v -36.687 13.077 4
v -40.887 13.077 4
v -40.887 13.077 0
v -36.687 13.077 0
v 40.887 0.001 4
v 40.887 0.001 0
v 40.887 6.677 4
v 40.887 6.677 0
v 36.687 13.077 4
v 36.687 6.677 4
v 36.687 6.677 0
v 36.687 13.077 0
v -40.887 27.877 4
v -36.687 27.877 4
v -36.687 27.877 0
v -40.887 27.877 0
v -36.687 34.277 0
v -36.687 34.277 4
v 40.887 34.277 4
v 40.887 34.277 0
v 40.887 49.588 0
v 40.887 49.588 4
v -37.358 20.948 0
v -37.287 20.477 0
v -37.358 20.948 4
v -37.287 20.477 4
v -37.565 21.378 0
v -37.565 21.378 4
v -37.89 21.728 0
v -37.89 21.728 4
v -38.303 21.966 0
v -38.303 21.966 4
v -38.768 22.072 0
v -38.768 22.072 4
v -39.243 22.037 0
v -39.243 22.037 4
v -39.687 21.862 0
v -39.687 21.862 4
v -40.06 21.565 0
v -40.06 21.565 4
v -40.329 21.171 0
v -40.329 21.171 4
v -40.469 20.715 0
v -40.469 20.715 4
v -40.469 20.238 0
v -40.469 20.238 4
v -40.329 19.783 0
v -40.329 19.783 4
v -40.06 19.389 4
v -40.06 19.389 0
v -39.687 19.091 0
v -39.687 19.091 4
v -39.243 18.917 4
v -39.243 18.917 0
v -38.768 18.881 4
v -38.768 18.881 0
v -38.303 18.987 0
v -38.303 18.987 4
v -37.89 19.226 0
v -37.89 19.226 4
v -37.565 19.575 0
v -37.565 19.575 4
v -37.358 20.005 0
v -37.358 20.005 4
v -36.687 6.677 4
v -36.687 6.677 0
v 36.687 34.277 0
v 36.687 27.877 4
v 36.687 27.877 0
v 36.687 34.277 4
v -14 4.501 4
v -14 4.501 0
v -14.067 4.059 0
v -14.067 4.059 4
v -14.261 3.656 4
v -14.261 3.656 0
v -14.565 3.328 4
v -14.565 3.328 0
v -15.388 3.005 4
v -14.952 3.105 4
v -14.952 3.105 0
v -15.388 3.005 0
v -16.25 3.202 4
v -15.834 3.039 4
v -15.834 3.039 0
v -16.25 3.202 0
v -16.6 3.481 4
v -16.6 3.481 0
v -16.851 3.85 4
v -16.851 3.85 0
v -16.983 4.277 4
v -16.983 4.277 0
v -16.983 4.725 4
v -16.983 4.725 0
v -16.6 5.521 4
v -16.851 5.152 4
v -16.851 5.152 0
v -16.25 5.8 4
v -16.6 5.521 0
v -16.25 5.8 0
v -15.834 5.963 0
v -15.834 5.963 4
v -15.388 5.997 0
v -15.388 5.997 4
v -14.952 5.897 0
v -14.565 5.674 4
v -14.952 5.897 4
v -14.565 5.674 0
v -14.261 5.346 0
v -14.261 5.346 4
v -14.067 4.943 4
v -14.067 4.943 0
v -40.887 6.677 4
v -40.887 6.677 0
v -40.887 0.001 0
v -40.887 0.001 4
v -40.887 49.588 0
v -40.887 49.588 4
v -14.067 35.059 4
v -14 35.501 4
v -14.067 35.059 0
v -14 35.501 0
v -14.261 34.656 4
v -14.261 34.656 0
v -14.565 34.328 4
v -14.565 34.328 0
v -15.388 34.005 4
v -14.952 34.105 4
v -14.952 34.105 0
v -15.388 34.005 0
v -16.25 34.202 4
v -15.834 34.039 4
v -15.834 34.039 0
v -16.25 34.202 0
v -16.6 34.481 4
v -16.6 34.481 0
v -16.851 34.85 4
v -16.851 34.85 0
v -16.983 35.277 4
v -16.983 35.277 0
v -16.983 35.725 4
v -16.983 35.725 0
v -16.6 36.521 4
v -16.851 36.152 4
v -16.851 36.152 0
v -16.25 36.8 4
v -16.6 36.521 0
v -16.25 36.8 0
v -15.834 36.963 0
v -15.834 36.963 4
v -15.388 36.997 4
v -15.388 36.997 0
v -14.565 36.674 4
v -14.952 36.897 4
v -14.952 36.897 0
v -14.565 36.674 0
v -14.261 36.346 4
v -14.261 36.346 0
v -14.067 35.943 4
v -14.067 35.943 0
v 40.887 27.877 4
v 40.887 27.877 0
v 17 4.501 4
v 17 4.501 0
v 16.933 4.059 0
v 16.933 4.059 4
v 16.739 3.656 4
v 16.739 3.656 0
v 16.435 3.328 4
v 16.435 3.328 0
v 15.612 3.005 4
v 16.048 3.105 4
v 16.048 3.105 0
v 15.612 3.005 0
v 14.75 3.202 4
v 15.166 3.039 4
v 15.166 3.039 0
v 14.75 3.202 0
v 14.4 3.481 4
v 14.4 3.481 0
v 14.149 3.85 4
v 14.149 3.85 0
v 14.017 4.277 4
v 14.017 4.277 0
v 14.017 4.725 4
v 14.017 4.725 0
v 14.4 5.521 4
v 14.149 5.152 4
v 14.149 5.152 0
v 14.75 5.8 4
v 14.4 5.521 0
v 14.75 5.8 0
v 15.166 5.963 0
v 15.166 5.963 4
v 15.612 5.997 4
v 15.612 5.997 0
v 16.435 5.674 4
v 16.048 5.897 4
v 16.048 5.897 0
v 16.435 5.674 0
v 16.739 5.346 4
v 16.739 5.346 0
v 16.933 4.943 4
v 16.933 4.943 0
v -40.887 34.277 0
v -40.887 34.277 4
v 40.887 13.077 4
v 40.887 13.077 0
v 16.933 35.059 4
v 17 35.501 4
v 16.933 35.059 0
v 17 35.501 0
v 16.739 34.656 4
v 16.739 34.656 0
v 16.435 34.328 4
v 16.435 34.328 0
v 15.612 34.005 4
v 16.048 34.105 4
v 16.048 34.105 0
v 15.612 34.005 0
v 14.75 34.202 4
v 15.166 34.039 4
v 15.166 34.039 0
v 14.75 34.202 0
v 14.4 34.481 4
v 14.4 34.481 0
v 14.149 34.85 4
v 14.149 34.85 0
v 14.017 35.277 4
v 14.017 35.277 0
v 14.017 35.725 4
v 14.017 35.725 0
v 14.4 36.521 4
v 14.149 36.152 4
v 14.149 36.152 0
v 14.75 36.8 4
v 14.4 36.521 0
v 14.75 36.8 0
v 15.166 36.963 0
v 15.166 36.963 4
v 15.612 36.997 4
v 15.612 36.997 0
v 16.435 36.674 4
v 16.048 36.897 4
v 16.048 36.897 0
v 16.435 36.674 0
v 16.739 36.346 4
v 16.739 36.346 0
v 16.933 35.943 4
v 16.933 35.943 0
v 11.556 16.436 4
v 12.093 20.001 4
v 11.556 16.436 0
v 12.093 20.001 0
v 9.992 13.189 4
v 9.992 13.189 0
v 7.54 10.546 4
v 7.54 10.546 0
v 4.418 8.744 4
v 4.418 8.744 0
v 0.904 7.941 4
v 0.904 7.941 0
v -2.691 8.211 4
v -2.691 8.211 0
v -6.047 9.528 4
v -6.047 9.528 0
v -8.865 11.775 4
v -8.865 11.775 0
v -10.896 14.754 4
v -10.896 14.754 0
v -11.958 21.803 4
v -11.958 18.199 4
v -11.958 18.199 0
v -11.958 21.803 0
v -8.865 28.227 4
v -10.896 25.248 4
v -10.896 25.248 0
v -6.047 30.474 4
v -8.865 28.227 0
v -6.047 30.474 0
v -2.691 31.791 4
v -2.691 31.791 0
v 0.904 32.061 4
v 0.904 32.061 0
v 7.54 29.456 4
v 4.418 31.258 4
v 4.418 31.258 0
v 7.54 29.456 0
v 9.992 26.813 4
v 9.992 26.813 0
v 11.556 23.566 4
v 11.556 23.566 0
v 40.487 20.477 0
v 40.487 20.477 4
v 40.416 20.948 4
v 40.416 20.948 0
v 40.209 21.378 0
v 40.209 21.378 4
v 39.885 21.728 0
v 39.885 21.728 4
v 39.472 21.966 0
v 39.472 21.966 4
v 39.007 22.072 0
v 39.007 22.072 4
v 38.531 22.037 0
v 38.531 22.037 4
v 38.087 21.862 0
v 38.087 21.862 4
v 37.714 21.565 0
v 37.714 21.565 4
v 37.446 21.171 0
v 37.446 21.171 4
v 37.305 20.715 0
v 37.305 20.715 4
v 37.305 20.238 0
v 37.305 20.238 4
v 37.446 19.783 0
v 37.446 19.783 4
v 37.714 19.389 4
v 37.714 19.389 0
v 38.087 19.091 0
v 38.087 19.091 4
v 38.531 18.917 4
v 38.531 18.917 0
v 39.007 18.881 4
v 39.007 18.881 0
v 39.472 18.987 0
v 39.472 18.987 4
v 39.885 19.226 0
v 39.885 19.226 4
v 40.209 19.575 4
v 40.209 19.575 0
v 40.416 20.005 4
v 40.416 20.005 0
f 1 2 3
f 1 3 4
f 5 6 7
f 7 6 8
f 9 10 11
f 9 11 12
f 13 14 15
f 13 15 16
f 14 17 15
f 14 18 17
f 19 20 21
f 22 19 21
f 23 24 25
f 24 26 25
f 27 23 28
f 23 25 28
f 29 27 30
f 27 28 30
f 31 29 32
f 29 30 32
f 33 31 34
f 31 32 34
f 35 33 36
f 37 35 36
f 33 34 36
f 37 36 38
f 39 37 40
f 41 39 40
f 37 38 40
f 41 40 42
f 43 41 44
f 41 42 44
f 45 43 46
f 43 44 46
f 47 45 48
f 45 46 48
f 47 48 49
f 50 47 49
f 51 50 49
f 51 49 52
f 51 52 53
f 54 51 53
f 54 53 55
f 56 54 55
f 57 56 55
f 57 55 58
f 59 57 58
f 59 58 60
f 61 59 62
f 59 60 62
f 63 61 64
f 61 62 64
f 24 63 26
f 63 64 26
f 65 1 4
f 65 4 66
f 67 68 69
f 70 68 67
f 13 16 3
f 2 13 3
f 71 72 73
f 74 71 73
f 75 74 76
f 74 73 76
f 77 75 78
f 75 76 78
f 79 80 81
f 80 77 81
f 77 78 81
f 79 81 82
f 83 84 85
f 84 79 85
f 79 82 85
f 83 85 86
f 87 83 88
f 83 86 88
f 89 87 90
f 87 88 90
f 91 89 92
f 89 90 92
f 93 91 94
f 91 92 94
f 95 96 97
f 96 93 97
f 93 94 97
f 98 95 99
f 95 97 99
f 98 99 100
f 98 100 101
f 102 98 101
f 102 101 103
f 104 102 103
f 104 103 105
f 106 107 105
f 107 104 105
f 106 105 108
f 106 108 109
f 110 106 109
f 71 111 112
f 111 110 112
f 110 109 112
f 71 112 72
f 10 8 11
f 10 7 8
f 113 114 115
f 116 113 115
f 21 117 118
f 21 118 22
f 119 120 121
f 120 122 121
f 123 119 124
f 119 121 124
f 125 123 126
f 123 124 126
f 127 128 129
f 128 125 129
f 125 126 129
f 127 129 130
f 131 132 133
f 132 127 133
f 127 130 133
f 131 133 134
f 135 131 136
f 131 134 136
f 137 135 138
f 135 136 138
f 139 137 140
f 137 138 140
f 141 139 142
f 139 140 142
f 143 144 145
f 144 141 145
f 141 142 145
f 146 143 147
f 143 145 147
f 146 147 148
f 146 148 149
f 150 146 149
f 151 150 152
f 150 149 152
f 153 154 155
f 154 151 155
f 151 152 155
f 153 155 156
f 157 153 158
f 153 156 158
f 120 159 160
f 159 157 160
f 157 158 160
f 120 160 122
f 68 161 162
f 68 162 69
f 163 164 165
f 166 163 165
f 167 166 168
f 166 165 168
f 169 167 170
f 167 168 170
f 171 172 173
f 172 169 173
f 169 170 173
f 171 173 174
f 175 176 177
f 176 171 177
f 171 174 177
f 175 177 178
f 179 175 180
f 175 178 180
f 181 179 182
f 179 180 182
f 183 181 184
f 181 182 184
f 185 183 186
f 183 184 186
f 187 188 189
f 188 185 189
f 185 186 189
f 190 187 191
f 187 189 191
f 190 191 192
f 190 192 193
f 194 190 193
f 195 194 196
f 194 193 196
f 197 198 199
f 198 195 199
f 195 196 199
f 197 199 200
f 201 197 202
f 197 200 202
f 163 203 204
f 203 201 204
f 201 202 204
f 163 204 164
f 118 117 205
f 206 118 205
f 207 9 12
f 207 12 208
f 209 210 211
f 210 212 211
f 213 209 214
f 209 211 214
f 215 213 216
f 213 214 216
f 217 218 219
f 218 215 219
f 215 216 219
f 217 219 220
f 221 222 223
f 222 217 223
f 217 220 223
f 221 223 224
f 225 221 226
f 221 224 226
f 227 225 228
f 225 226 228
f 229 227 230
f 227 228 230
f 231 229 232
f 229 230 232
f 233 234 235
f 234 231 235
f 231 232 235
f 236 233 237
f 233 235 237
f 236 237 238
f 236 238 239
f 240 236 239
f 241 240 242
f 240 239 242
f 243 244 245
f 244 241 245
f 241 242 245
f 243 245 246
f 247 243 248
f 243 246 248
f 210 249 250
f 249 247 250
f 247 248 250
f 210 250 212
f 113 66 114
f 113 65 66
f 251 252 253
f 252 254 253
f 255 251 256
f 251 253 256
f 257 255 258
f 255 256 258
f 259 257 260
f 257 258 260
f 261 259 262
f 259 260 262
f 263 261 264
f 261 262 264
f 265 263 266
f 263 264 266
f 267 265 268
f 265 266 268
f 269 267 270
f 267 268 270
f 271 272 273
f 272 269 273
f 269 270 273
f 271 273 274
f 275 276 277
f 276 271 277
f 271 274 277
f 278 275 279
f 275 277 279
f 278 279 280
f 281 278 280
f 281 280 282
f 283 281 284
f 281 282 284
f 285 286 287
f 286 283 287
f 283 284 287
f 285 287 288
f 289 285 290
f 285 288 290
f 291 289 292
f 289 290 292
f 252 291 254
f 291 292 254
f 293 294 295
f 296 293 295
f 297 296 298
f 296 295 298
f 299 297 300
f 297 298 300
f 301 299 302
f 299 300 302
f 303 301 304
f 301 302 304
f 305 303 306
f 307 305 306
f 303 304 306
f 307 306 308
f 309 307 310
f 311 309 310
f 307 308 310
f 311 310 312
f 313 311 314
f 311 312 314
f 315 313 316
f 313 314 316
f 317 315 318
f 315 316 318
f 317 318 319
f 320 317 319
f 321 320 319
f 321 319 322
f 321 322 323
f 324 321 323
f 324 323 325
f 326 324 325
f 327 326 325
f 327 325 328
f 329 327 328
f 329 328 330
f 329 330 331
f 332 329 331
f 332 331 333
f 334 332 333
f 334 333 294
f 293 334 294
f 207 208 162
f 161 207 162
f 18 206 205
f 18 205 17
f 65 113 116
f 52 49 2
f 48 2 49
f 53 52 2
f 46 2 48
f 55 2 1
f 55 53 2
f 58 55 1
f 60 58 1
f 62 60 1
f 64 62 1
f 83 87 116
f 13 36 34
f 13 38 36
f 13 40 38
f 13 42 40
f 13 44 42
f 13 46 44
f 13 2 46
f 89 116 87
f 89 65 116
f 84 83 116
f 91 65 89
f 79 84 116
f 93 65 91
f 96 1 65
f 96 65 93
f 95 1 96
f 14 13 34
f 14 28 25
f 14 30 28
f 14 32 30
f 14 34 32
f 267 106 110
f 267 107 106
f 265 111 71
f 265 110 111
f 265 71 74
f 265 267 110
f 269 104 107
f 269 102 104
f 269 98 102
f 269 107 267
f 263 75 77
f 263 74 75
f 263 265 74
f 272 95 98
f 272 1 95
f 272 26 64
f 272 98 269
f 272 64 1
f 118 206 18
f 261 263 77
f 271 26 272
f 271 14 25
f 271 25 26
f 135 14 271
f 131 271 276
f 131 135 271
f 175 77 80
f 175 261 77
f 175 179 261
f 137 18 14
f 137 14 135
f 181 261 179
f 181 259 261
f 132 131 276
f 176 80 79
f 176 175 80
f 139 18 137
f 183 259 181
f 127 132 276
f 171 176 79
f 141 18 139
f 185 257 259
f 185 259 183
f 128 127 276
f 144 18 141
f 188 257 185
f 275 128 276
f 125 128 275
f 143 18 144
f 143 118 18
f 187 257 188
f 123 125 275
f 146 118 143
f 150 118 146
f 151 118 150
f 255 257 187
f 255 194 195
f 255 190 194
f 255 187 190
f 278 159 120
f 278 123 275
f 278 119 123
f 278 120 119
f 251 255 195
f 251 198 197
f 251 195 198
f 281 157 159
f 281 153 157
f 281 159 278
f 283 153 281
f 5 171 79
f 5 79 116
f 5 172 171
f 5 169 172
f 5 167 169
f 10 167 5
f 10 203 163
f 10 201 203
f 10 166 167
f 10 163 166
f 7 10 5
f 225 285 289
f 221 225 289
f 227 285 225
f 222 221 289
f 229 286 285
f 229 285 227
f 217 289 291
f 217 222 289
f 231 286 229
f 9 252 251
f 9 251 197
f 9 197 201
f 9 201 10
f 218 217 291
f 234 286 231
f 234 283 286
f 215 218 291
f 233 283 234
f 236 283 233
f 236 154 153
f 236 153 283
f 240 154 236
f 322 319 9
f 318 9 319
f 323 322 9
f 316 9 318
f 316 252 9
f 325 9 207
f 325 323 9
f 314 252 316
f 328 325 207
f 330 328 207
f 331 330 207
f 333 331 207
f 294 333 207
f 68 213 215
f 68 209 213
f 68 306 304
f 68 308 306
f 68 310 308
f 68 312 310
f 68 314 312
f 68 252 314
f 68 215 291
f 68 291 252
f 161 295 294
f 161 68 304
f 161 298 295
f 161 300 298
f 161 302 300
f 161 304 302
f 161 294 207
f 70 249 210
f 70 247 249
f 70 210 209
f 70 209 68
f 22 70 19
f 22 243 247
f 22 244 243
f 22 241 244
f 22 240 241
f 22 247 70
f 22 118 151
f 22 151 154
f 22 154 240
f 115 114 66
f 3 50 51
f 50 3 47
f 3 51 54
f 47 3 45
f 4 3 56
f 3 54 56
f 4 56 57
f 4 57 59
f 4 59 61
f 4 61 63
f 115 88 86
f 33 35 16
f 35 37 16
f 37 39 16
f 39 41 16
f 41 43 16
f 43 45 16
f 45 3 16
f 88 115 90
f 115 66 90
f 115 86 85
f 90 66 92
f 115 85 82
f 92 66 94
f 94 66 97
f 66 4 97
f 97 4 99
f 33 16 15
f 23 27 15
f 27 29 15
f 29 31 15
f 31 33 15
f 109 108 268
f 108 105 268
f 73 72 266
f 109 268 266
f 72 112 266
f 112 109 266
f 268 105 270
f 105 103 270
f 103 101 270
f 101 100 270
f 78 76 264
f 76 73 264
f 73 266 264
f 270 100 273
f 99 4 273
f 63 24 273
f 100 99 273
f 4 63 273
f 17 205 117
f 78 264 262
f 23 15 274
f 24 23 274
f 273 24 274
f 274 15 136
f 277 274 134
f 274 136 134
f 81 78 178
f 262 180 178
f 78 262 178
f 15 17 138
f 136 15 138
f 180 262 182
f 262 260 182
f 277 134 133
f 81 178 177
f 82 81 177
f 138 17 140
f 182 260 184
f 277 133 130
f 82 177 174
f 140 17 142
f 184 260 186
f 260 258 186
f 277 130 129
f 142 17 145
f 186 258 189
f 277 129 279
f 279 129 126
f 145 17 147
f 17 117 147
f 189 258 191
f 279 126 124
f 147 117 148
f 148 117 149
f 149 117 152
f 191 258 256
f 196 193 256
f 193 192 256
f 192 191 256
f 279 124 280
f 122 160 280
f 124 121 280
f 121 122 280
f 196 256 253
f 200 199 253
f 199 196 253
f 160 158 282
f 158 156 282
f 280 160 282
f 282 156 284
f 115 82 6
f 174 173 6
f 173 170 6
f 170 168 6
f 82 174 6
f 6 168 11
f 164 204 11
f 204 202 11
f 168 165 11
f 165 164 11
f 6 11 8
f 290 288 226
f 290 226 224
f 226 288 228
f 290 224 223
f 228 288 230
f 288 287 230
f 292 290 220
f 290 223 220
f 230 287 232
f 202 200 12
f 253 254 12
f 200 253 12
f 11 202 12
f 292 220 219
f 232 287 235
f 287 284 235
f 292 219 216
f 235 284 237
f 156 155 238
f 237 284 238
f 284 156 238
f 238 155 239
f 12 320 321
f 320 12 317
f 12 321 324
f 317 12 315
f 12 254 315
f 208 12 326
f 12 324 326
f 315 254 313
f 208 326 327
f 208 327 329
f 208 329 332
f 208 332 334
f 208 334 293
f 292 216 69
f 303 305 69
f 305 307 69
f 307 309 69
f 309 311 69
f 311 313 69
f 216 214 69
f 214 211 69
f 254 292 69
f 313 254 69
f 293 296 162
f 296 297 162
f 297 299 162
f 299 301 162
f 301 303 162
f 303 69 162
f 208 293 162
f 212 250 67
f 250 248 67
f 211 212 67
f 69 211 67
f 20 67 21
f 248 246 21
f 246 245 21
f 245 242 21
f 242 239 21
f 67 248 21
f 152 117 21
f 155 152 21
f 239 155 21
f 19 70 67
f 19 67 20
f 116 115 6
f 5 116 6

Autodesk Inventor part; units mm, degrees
ref_plane "YZ Plane" through (0, 0, 0) normal (1, 0, 0) x (0, 1, 0)
ref_plane "XZ Plane" through (0, 0, 0) normal (0, 1, 0) x (-1, 0, 0)
ref_plane "XY Plane" through (0, 0, 0) normal (0, 0, 1) x (1, 0, 0)
sketch "Sketch1" plane through (0, 0, 0) normal (0, 0, 1) x (1, 0, 0)
  line L0 (20, 35.0868) -> (15.0858, 40.001) construction
  line L1 (15.0858, 40.001) -> (-15.0858, 40.001) construction
  line L2 (-15.0858, 40.001) -> (-20, 35.0868) construction
  line L3 (-20, 35.0868) -> (-20, 4.9152) construction
  line L4 (-20, 4.9152) -> (-15.0858, 0.001) construction
  line L5 (-15.0858, 0.001) -> (15.0858, 0.001) construction
  line L6 (15.0858, 0.001) -> (20, 4.9152) construction
  line L7 (20, 4.9152) -> (20, 35.0868) construction
  spline S0 degree 3 number of poles 98 construction
  spline S1 degree 3 number of poles 98 construction
  spline S2 degree 3 number of poles 98 construction
  spline S3 degree 3 number of poles 98 construction
  circle A0 centre (0, 20.001) radius 11 construction
  spline S4 degree 3 number of poles 98 construction
  spline S5 degree 3 number of poles 98 construction
  spline S6 degree 3 number of poles 98 construction
  spline S7 degree 3 number of poles 98 construction
  line L8 (-152.3368, 49.5885) -> (152.3133, 49.5884) construction
  line L9 (-40.8871, 0.001) -> (40.8871, 0.001)
  line L10 (40.8871, 0.001) -> (40.8871, 40.001)
  line L11 (40.8871, 40.001) -> (-40.8871, 40.001)
  line L12 (-40.8871, 40.001) -> (-40.8871, 0.001)
  line L13 (-40.8871, 0.001) -> (40.8871, 40.001) construction
  line L14 (40.8871, 0.001) -> (-40.8871, 40.001) construction
  line L15 (40.8871, 40.001) -> (-40.8871, 40.001)
  line L16 (-40.8871, 40.001) -> (-40.8871, 49.5885)
  line L17 (-40.8871, 49.5885) -> (40.8871, 49.5885)
  line L18 (40.8871, 49.5885) -> (40.8871, 40.001)
  circle A1 centre (15.5, 4.501) radius 1.5
  circle A2 centre (-15.5, 4.501) radius 1.5
  circle A3 centre (-15.5, 35.501) radius 1.5
  circle A4 centre (15.5, 35.501) radius 1.5
  circle A5 centre (0, 20.001) radius 12.0934
  point P0 (0, 0)
extrude "Extrusion1" add sketch "Sketch1" along normal blind 4
sketch "Sketch2" plane through (0, 0, 4) normal (0, 0, 1) x (1, 0, 0)
  line L0 (36.8871, 28.0768) -> (36.8871, 34.0768) construction
  line L1 (36.8871, 28.0768) -> (40.8871, 28.0768) construction
  line L2 (40.8871, 34.0768) -> (40.8871, 28.0768) construction
  line L3 (36.8871, 34.0768) -> (40.8871, 34.0768) construction
  line L4 (36.8871, 6.8768) -> (36.8871, 12.8768) construction
  line L5 (36.8871, 6.8768) -> (40.8871, 6.8768) construction
  line L6 (40.8871, 12.8768) -> (40.8871, 6.8768) construction
  line L7 (36.8871, 12.8768) -> (40.8871, 12.8768) construction
  line L8 (-40.8871, 28.0768) -> (-40.8871, 34.0768) construction
  line L9 (-40.8871, 28.0768) -> (-36.8871, 28.0768) construction
  line L10 (-36.8871, 34.0768) -> (-36.8871, 28.0768) construction
  line L11 (-40.8871, 34.0768) -> (-36.8871, 34.0768) construction
  line L12 (-40.8871, 6.8768) -> (-40.8871, 12.8768) construction
  line L13 (-40.8871, 6.8768) -> (-36.8871, 6.8768) construction
  line L14 (-36.8871, 12.8768) -> (-36.8871, 6.8768) construction
  line L15 (-40.8871, 12.8768) -> (-36.8871, 12.8768) construction
  line L16 (-40.8871, 18.9768) -> (-40.8871, 21.9768) construction
  line L17 (-40.8871, 18.9768) -> (-36.8871, 18.9768) construction
  line L18 (-36.8871, 21.9768) -> (-36.8871, 18.9768) construction
  line L19 (-40.8871, 21.9768) -> (-36.8871, 21.9768) construction
  line L20 (36.8871, 18.9768) -> (36.8871, 21.9768) construction
  line L21 (36.8871, 18.9768) -> (40.8871, 18.9768) construction
  line L22 (40.8871, 21.9768) -> (40.8871, 18.9768) construction
  line L23 (36.8871, 21.9768) -> (40.8871, 21.9768) construction
  circle A0 centre (-38.8871, 20.4768) radius 1.6
  circle A1 centre (38.8871, 20.4768) radius 1.6
  line L24 (-36.6871, 34.2768) -> (-36.6871, 27.8768)
  line L25 (-36.6871, 27.8768) -> (-41.0871, 27.8768)
  line L26 (-41.0871, 27.8768) -> (-41.0871, 34.2768)
  line L27 (-41.0871, 34.2768) -> (-36.6871, 34.2768)
  line L28 (-36.6871, 13.0768) -> (-36.6871, 6.6768)
  line L29 (-36.6871, 6.6768) -> (-41.0871, 6.6768)
  line L30 (-41.0871, 6.6768) -> (-41.0871, 13.0768)
  line L31 (-41.0871, 13.0768) -> (-36.6871, 13.0768)
  line L32 (41.0871, 34.2768) -> (41.0871, 27.8768)
  line L33 (41.0871, 27.8768) -> (36.6871, 27.8768)
  line L34 (36.6871, 27.8768) -> (36.6871, 34.2768)
  line L35 (36.6871, 34.2768) -> (41.0871, 34.2768)
  line L36 (41.0871, 13.0768) -> (41.0871, 6.6768)
  line L37 (41.0871, 6.6768) -> (36.6871, 6.6768)
  line L38 (36.6871, 6.6768) -> (36.6871, 13.0768)
  line L39 (36.6871, 13.0768) -> (41.0871, 13.0768)
  point P0 (0, 0)
  dimension "d2" = 3.2
  dimension "d3" = 3.2
  dimension "d4" = 0.2
  dimension "d5" = 0.2
  dimension "d6" = 0.2
  dimension "d7" = 0.2
extrude "Extrusion2" cut sketch "Sketch2" against normal through all
sketch "Sketch3" plane through (0, 0, 4) normal (0, 0, 1) x (1, 0, 0)
  point P0 (0, 0)
properties part number "Motor_brace_2"
